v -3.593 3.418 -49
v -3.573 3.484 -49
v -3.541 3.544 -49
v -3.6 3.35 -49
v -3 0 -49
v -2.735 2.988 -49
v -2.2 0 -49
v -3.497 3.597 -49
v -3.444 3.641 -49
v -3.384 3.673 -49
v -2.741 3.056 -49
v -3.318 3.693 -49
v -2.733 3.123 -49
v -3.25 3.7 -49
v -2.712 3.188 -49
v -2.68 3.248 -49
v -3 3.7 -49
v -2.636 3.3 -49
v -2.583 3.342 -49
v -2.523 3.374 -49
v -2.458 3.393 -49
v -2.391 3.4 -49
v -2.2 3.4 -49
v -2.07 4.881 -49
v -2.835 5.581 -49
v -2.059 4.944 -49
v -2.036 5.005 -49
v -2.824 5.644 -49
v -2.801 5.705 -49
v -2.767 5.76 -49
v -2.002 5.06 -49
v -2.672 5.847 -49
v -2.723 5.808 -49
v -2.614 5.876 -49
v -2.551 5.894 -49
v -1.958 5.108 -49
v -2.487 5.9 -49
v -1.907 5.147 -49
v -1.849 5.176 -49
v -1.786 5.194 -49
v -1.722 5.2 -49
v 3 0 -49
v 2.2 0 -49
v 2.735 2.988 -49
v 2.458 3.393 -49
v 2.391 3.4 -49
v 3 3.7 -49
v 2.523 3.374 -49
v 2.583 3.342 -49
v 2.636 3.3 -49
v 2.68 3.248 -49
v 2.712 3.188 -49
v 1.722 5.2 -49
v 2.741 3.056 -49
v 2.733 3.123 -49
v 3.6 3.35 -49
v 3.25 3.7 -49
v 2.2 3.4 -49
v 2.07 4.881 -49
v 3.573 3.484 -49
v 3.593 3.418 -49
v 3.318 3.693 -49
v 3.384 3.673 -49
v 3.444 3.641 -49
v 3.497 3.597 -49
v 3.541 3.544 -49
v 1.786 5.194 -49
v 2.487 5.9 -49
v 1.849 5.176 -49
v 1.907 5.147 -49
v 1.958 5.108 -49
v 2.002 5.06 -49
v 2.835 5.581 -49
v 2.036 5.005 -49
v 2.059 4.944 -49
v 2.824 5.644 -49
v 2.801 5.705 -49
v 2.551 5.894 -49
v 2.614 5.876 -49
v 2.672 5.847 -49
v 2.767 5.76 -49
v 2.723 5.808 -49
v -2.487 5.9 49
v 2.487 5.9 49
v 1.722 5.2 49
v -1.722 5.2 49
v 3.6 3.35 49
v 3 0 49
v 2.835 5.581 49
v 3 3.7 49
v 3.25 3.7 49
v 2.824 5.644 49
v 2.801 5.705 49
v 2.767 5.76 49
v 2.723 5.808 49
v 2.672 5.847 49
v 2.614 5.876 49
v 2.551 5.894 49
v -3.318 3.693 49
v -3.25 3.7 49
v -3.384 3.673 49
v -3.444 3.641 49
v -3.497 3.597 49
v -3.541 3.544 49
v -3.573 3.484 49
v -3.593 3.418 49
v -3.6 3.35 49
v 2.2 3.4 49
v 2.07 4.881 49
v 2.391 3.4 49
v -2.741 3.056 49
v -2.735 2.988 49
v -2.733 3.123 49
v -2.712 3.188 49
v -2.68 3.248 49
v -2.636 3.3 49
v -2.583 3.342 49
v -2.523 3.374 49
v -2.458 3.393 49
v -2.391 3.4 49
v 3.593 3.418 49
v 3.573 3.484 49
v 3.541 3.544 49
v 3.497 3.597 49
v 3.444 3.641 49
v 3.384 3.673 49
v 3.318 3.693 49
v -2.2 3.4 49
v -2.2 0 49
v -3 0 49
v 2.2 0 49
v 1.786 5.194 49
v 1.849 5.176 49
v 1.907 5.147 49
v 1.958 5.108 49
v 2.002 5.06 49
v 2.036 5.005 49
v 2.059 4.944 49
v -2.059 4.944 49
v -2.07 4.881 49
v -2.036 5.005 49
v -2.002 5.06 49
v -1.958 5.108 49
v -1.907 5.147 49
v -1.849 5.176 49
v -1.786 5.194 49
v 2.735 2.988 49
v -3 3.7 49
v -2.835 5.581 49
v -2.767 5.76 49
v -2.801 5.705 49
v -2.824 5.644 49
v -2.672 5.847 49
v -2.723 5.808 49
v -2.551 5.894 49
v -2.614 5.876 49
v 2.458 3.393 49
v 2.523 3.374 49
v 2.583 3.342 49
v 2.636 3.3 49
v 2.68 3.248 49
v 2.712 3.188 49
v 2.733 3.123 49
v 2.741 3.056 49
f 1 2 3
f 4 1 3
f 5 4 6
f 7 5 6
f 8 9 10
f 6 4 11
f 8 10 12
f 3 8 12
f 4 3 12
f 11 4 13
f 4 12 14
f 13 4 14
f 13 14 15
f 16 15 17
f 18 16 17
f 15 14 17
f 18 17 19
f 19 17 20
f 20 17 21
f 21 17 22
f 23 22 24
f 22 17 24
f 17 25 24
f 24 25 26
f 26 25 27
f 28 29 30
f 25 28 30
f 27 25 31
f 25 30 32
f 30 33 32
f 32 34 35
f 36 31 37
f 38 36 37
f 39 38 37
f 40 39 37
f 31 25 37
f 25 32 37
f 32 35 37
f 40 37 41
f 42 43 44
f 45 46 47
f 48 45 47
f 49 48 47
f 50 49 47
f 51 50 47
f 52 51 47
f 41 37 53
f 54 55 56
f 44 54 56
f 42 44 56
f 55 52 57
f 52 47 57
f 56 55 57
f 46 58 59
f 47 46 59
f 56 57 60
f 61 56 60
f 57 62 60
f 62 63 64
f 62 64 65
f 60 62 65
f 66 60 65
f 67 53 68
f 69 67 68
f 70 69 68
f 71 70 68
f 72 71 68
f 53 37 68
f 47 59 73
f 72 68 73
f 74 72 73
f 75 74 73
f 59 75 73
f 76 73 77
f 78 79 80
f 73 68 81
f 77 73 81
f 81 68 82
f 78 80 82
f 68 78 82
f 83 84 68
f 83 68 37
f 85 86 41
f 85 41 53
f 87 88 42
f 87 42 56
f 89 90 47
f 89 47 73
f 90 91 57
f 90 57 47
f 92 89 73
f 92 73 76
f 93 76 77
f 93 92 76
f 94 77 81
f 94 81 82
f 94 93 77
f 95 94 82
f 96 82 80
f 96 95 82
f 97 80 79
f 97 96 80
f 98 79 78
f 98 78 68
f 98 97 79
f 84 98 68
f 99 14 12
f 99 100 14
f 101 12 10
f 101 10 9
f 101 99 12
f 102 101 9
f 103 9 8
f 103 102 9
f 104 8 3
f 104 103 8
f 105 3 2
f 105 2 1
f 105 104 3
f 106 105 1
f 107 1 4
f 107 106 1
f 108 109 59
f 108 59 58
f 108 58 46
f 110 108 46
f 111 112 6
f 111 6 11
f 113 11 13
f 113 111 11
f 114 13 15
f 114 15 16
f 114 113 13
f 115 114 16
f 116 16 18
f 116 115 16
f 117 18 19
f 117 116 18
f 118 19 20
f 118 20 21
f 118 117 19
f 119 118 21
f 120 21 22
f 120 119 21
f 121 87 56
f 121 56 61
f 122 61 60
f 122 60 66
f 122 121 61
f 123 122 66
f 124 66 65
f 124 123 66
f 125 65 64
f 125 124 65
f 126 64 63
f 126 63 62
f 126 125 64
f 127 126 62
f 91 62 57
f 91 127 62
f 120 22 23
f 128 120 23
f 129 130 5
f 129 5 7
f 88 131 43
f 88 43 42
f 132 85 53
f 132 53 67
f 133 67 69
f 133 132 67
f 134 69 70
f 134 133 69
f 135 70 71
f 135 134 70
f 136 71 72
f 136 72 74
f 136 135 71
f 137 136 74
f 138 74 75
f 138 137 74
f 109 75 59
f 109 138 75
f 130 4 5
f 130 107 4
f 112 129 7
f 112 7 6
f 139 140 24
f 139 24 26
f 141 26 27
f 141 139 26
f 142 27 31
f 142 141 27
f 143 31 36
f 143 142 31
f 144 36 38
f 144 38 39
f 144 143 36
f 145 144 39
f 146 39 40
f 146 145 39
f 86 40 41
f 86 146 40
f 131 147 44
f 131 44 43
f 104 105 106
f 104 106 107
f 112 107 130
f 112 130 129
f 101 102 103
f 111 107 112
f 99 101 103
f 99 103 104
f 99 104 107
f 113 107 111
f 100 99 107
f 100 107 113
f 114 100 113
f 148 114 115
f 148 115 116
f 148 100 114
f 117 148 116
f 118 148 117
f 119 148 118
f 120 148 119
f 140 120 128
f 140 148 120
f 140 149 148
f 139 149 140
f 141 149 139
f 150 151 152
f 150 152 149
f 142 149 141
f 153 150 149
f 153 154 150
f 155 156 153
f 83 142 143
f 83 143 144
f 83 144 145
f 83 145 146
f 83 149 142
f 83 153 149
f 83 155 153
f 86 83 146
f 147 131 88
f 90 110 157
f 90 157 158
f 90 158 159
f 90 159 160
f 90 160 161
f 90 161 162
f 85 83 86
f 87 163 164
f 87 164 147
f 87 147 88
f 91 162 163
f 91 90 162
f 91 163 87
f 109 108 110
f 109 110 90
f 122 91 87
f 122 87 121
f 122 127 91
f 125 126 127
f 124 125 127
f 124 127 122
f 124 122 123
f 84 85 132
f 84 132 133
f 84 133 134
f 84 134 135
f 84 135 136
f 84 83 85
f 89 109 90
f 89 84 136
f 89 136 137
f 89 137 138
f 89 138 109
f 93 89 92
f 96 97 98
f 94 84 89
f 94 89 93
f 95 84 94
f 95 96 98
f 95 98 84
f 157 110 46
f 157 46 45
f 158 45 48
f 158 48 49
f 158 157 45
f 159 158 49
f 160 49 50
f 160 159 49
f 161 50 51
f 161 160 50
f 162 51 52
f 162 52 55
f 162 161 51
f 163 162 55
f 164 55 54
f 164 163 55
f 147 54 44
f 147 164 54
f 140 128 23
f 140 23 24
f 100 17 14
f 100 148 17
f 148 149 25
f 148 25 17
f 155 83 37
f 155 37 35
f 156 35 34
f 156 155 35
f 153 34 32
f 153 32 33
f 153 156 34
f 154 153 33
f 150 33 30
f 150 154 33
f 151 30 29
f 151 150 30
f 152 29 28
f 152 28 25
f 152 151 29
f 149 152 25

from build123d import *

# Parameters (mm, degrees)
BOSS_EXTRUDE1_DEPTH = 49


with BuildPart() as part:
    # Sketch1 → Boss-Extrude1 (new body, symmetric)
    with BuildSketch(Plane.XY):
        with BuildLine():
            Line((-3.6, 3.35), (-3, 0))
            Line((-3, 0), (-2.2, 0))
            Line((-2.2, 0), (-2.735217071, 2.988295315))
            ThreePointArc((-2.735217071, 2.988295315), (-2.659117427, 3.274614514), (-2.390699246, 3.4))
            Line((-2.390699246, 3.4), (-2.2, 3.4))
            Line((-2.2, 3.4), (-2.070472639, 4.88050451))
            ThreePointArc((-2.070472639, 4.88050451), (-1.958261067, 5.108047068), (-1.721804495, 5.2))
            Line((-1.721804495, 5.2), (1.721804495, 5.2))
            ThreePointArc((1.721804495, 5.2), (1.958261067, 5.108047068), (2.070472639, 4.88050451))
            Line((2.070472639, 4.88050451), (2.2, 3.4))
            Line((2.2, 3.4), (2.390699246, 3.4))
            ThreePointArc((2.390699246, 3.4), (2.659117427, 3.274614514), (2.735217071, 2.988295315))
            Line((2.735217071, 2.988295315), (2.2, 0))
            Line((2.2, 0), (3, 0))
            Line((3, 0), (3.6, 3.35))
            ThreePointArc((3.6, 3.35), (3.497487373, 3.597487373), (3.25, 3.7))
            Line((3.25, 3.7), (3, 3.7))
            Line((3, 3.7), (2.835477174, 5.58050451))
            ThreePointArc((2.835477174, 5.58050451), (2.723265602, 5.808047068), (2.486809029, 5.9))
            Line((2.486809029, 5.9), (-2.486809029, 5.9))
            ThreePointArc((-2.486809029, 5.9), (-2.723265602, 5.808047068), (-2.835477174, 5.58050451))
            Line((-2.835477174, 5.58050451), (-3, 3.7))
            Line((-3, 3.7), (-3.25, 3.7))
            ThreePointArc((-3.25, 3.7), (-3.497487373, 3.597487373), (-3.6, 3.35))
        make_face()
    extrude(amount=BOSS_EXTRUDE1_DEPTH, both=True)


solid = part.part
